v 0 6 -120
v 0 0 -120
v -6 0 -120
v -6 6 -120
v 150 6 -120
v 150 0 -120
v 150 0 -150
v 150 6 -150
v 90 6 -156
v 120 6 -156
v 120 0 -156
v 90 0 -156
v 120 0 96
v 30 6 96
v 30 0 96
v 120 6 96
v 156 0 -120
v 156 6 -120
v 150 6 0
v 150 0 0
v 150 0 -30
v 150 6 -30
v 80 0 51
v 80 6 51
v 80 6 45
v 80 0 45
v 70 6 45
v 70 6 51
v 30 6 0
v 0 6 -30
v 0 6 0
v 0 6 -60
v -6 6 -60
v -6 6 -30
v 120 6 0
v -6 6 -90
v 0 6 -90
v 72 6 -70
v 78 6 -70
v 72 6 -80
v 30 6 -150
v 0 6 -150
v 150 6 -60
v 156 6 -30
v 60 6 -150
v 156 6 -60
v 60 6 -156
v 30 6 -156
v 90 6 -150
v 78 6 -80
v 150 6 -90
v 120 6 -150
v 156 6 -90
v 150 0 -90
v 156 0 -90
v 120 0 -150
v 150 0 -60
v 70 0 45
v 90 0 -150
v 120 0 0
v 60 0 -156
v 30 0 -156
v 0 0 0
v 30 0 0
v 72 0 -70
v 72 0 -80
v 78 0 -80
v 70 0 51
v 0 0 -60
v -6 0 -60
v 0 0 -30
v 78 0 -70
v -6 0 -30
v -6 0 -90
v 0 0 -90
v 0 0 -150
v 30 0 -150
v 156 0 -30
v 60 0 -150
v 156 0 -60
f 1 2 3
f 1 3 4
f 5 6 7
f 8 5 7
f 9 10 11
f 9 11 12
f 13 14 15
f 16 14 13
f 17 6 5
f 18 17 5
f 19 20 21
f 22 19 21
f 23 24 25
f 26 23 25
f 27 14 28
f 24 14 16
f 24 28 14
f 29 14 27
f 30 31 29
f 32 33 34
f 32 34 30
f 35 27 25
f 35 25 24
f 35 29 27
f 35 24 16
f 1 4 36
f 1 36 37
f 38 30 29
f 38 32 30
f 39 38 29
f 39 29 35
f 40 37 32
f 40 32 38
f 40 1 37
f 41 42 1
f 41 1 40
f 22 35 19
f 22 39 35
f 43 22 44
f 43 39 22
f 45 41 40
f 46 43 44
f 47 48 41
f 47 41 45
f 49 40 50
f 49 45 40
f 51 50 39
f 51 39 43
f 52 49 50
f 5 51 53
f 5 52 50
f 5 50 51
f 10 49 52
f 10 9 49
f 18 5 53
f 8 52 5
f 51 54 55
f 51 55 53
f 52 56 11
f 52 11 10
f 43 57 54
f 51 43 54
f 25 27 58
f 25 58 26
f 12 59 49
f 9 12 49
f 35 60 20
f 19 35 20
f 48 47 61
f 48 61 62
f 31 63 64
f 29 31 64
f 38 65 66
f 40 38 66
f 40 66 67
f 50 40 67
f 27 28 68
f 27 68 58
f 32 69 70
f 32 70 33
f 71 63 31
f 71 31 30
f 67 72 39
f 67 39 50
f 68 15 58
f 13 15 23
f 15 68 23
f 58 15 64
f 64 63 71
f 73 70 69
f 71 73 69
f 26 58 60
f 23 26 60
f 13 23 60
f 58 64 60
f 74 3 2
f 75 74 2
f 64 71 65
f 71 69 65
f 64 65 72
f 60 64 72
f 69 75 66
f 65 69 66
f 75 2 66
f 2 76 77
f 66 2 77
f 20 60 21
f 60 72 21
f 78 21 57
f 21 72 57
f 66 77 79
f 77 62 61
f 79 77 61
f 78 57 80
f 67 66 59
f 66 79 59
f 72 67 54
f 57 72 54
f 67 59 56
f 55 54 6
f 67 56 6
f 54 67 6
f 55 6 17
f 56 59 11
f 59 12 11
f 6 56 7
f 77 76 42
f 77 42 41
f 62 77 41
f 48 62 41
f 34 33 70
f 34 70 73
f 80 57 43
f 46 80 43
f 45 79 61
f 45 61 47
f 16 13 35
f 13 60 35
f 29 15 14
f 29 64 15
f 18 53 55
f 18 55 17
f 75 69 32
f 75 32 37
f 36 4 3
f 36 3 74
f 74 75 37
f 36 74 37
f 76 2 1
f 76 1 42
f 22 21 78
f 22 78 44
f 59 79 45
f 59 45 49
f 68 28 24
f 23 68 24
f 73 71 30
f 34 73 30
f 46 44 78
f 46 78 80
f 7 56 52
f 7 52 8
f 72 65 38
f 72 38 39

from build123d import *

# Parameters (mm, degrees)
ESBO_O1_W                  = 150
ESBO_O1_H                  = 150
RESSALTO_EXTRUS_O1_DEPTH   = 6
ESBO_O3_W                  = 30
ESBO_O3_H                  = 6
RESSALTO_EXTRUS_O3_DEPTH   = 6
ESBO_O6_W                  = 30
ESBO_O6_H                  = 6
RESSALTO_EXTRUS_O6_DEPTH   = 6
ESBO_O7_W                  = 30
ESBO_O7_H                  = 6
RESSALTO_EXTRUS_O8_DEPTH   = 6
ESBO_O9_W                  = 90
ESBO_O9_H                  = 6
RESSALTO_EXTRUS_O9_DEPTH   = 6
ESBO_O10_W                 = 90
ESBO_O10_H                 = 6
RESSALTO_EXTRUS_O10_DEPTH  = 90
ESBO_O11_W                 = 10
ESBO_O11_H                 = 6
CORTE_EXTRUS_O1_DEPTH      = 221.698889893
CORTE_EXTRUS_O2_DEPTH      = 221.698889893
CORTE_EXTRUS_O2_DEPTH_BACK = 221.698889893
ESBO_O12_W                 = 6
ESBO_O12_H                 = 10


with BuildPart() as part:
    # Esboço1 → Ressalto-extrusão1 (new body)
    with BuildSketch(Plane(origin=(0, 0, 0), x_dir=(1, 0, 0), z_dir=(0, 1, 0))):
        with Locations((75, 75)):
            Rectangle(ESBO_O1_W, ESBO_O1_H)
    extrude(amount=RESSALTO_EXTRUS_O1_DEPTH)

    # Esboço3 → Ressalto-extrusão3 (add)
    with BuildSketch(Plane(origin=(0, 0, -150), x_dir=(-1, 0, 0), z_dir=(0, 0, -1))):
        with Locations((-105, 3)):
            Rectangle(ESBO_O3_W, ESBO_O3_H)
        with Locations((-45, 3)):
            Rectangle(ESBO_O3_W, ESBO_O3_H)
    extrude(amount=RESSALTO_EXTRUS_O3_DEPTH)

    # Esboço6 → Ressalto-extrusão6 (add)
    with BuildSketch(Plane(origin=(150, 0, 0), x_dir=(0, 0, -1), z_dir=(1, 0, 0))):
        with Locations((45, 3)):
            Rectangle(ESBO_O6_W, ESBO_O6_H)
        with Locations((105, 3)):
            Rectangle(ESBO_O6_W, ESBO_O6_H)
    extrude(amount=RESSALTO_EXTRUS_O6_DEPTH)

    # Esboço7 → Ressalto-extrusão8 (add)
    with BuildSketch(Plane.ZY):
        with Locations((-105, 3)):
            Rectangle(ESBO_O7_W, ESBO_O7_H)
        with Locations((-45, 3)):
            Rectangle(ESBO_O7_W, ESBO_O7_H)
    extrude(amount=RESSALTO_EXTRUS_O8_DEPTH)

    # Esboço9 → Ressalto-extrusão9 (add)
    with BuildSketch(Plane.XY):
        with Locations((75, 3)):
            Rectangle(ESBO_O9_W, ESBO_O9_H)
    extrude(amount=RESSALTO_EXTRUS_O9_DEPTH)

    # Esboço10 → Ressalto-extrusão10 (add)
    with BuildSketch(Plane.XY.offset(6)):
        with Locations((75, 3)):
            Rectangle(ESBO_O10_W, ESBO_O10_H)
    extrude(amount=RESSALTO_EXTRUS_O10_DEPTH)

    # Esboço11 → Corte-extrusão1 (cut, through all)
    with BuildSketch(Plane(origin=(0, 6, 0), x_dir=(1, 0, 0), z_dir=(0, 1, 0))):
        with Locations((75, -48)):
            Rectangle(ESBO_O11_W, ESBO_O11_H)
    extrude(amount=-CORTE_EXTRUS_O1_DEPTH, mode=Mode.SUBTRACT)

    # Esboço12 → Corte-extrusão2 (cut, two sides: drawn at the far end of the back side and taken through both)
    with BuildSketch(Plane(origin=(0, 6, 0), x_dir=(1, 0, 0), z_dir=(0, 1, 0)).offset(-CORTE_EXTRUS_O2_DEPTH_BACK)):
        with Locations((75, 75)):
            Rectangle(ESBO_O12_W, ESBO_O12_H)
    extrude(amount=CORTE_EXTRUS_O2_DEPTH + CORTE_EXTRUS_O2_DEPTH_BACK, mode=Mode.SUBTRACT)


solid = part.part
